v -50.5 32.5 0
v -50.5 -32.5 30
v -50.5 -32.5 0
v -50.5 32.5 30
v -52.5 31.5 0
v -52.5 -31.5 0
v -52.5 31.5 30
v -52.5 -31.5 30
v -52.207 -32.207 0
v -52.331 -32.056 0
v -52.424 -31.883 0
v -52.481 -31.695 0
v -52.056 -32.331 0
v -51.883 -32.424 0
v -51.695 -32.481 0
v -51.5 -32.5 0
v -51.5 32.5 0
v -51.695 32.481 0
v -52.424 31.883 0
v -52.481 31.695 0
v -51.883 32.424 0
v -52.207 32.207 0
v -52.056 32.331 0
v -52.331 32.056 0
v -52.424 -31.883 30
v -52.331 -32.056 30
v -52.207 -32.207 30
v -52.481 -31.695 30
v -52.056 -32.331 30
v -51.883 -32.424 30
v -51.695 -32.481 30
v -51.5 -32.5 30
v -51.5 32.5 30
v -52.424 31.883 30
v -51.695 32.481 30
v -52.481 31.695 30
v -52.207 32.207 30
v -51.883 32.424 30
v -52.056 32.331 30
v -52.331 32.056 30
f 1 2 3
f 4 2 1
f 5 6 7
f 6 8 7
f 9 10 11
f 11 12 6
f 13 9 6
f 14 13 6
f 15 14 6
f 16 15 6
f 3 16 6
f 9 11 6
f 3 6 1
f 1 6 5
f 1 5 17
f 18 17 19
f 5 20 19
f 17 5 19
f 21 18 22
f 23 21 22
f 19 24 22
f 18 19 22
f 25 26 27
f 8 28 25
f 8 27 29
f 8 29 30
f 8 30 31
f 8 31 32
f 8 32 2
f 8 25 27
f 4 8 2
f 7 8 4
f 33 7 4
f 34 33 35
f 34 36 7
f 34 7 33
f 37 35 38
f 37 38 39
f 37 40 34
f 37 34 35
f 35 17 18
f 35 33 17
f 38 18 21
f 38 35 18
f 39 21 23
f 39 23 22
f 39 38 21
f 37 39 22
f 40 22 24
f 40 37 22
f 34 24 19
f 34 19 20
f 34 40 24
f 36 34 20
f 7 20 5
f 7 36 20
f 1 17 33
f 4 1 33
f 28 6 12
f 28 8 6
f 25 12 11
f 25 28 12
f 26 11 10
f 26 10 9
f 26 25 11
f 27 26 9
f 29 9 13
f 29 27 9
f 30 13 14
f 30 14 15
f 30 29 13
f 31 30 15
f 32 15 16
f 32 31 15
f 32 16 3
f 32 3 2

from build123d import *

# Parameters (mm, degrees)
SKETCH005_W  = 65
SKETCH005_H  = 30
PAD004_DEPTH = 2
FILLET016_R  = 1
FILLET021_R  = 1


with BuildPart() as part:
    # Sketch005 → Pad004 (new body)
    with BuildSketch(Plane.YZ):
        with Locations((0, 15)):
            Rectangle(SKETCH005_W, SKETCH005_H)
    extrude(amount=PAD004_DEPTH)

    # Fillet016
    fillet016_edges = [part.edges().sort_by_distance(p)[0] for p in [
        (0, 32.5, 15),
    ]]
    fillet(fillet016_edges, radius=FILLET016_R)

    # Fillet021
    fillet021_edges = [part.edges().sort_by_distance(p)[0] for p in [
        (0, -32.5, 15),
    ]]
    fillet(fillet021_edges, radius=FILLET021_R)


with BuildPart() as part_1:
    # Body004 placement: moved
    add(part.part.moved(Location((-52.5, 0, 0))))


solid = part_1.part
